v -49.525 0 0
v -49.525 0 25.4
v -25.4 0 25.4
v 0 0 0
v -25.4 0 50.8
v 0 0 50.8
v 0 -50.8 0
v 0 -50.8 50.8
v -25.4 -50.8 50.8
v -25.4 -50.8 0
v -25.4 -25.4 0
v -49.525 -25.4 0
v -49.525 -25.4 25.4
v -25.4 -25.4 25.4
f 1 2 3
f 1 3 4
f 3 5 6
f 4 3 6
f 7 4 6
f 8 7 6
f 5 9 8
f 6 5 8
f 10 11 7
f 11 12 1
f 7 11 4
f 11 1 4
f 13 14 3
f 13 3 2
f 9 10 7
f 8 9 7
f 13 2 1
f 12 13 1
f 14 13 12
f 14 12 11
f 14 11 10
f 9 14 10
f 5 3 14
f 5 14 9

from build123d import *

# Parameters (mm, degrees)
F1_W     = 25.4
F1_H     = 25.4
F2_DEPTH = 25.4
F0_W     = 25.4
F0_H     = 50.8
F3_DEPTH = 50.8
F7_DEPTH = 25.4
F5_W     = 25.4
F5_H     = 50.8
F8_DEPTH = 50.8


with BuildPart() as f2:
    # F1 (on Right) → F2 (new body)
    with BuildSketch(Plane.YZ):
        with Locations((-12.7, 15.4623677161)):
            Rectangle(F1_W, F1_H)
    extrude(amount=F2_DEPTH)


with BuildPart() as f3:
    # F0 (on Front) → F3 (new body)
    with BuildSketch(Plane.XZ):
        with Locations((-18.8699130297, 27.4796054423)):
            Rectangle(F0_W, F0_H)
    extrude(amount=F3_DEPTH)


with BuildPart() as f7:
    # F6 (on Front) → F7 (new body)
    with BuildSketch(Plane.XZ):
        Polygon((-49.5253019035, 0), (-24.1253019035, 0), (-23.6774347723, 25.4), (-49.5253019035, 25.4), align=None)
    extrude(amount=F7_DEPTH)

    # F5 (on Front) → F8 (join)
    with BuildSketch(Plane.XZ):
        with Locations((-12.7, 25.4)):
            Rectangle(F5_W, F5_H)
    extrude(amount=F8_DEPTH)


solid = f7.part
